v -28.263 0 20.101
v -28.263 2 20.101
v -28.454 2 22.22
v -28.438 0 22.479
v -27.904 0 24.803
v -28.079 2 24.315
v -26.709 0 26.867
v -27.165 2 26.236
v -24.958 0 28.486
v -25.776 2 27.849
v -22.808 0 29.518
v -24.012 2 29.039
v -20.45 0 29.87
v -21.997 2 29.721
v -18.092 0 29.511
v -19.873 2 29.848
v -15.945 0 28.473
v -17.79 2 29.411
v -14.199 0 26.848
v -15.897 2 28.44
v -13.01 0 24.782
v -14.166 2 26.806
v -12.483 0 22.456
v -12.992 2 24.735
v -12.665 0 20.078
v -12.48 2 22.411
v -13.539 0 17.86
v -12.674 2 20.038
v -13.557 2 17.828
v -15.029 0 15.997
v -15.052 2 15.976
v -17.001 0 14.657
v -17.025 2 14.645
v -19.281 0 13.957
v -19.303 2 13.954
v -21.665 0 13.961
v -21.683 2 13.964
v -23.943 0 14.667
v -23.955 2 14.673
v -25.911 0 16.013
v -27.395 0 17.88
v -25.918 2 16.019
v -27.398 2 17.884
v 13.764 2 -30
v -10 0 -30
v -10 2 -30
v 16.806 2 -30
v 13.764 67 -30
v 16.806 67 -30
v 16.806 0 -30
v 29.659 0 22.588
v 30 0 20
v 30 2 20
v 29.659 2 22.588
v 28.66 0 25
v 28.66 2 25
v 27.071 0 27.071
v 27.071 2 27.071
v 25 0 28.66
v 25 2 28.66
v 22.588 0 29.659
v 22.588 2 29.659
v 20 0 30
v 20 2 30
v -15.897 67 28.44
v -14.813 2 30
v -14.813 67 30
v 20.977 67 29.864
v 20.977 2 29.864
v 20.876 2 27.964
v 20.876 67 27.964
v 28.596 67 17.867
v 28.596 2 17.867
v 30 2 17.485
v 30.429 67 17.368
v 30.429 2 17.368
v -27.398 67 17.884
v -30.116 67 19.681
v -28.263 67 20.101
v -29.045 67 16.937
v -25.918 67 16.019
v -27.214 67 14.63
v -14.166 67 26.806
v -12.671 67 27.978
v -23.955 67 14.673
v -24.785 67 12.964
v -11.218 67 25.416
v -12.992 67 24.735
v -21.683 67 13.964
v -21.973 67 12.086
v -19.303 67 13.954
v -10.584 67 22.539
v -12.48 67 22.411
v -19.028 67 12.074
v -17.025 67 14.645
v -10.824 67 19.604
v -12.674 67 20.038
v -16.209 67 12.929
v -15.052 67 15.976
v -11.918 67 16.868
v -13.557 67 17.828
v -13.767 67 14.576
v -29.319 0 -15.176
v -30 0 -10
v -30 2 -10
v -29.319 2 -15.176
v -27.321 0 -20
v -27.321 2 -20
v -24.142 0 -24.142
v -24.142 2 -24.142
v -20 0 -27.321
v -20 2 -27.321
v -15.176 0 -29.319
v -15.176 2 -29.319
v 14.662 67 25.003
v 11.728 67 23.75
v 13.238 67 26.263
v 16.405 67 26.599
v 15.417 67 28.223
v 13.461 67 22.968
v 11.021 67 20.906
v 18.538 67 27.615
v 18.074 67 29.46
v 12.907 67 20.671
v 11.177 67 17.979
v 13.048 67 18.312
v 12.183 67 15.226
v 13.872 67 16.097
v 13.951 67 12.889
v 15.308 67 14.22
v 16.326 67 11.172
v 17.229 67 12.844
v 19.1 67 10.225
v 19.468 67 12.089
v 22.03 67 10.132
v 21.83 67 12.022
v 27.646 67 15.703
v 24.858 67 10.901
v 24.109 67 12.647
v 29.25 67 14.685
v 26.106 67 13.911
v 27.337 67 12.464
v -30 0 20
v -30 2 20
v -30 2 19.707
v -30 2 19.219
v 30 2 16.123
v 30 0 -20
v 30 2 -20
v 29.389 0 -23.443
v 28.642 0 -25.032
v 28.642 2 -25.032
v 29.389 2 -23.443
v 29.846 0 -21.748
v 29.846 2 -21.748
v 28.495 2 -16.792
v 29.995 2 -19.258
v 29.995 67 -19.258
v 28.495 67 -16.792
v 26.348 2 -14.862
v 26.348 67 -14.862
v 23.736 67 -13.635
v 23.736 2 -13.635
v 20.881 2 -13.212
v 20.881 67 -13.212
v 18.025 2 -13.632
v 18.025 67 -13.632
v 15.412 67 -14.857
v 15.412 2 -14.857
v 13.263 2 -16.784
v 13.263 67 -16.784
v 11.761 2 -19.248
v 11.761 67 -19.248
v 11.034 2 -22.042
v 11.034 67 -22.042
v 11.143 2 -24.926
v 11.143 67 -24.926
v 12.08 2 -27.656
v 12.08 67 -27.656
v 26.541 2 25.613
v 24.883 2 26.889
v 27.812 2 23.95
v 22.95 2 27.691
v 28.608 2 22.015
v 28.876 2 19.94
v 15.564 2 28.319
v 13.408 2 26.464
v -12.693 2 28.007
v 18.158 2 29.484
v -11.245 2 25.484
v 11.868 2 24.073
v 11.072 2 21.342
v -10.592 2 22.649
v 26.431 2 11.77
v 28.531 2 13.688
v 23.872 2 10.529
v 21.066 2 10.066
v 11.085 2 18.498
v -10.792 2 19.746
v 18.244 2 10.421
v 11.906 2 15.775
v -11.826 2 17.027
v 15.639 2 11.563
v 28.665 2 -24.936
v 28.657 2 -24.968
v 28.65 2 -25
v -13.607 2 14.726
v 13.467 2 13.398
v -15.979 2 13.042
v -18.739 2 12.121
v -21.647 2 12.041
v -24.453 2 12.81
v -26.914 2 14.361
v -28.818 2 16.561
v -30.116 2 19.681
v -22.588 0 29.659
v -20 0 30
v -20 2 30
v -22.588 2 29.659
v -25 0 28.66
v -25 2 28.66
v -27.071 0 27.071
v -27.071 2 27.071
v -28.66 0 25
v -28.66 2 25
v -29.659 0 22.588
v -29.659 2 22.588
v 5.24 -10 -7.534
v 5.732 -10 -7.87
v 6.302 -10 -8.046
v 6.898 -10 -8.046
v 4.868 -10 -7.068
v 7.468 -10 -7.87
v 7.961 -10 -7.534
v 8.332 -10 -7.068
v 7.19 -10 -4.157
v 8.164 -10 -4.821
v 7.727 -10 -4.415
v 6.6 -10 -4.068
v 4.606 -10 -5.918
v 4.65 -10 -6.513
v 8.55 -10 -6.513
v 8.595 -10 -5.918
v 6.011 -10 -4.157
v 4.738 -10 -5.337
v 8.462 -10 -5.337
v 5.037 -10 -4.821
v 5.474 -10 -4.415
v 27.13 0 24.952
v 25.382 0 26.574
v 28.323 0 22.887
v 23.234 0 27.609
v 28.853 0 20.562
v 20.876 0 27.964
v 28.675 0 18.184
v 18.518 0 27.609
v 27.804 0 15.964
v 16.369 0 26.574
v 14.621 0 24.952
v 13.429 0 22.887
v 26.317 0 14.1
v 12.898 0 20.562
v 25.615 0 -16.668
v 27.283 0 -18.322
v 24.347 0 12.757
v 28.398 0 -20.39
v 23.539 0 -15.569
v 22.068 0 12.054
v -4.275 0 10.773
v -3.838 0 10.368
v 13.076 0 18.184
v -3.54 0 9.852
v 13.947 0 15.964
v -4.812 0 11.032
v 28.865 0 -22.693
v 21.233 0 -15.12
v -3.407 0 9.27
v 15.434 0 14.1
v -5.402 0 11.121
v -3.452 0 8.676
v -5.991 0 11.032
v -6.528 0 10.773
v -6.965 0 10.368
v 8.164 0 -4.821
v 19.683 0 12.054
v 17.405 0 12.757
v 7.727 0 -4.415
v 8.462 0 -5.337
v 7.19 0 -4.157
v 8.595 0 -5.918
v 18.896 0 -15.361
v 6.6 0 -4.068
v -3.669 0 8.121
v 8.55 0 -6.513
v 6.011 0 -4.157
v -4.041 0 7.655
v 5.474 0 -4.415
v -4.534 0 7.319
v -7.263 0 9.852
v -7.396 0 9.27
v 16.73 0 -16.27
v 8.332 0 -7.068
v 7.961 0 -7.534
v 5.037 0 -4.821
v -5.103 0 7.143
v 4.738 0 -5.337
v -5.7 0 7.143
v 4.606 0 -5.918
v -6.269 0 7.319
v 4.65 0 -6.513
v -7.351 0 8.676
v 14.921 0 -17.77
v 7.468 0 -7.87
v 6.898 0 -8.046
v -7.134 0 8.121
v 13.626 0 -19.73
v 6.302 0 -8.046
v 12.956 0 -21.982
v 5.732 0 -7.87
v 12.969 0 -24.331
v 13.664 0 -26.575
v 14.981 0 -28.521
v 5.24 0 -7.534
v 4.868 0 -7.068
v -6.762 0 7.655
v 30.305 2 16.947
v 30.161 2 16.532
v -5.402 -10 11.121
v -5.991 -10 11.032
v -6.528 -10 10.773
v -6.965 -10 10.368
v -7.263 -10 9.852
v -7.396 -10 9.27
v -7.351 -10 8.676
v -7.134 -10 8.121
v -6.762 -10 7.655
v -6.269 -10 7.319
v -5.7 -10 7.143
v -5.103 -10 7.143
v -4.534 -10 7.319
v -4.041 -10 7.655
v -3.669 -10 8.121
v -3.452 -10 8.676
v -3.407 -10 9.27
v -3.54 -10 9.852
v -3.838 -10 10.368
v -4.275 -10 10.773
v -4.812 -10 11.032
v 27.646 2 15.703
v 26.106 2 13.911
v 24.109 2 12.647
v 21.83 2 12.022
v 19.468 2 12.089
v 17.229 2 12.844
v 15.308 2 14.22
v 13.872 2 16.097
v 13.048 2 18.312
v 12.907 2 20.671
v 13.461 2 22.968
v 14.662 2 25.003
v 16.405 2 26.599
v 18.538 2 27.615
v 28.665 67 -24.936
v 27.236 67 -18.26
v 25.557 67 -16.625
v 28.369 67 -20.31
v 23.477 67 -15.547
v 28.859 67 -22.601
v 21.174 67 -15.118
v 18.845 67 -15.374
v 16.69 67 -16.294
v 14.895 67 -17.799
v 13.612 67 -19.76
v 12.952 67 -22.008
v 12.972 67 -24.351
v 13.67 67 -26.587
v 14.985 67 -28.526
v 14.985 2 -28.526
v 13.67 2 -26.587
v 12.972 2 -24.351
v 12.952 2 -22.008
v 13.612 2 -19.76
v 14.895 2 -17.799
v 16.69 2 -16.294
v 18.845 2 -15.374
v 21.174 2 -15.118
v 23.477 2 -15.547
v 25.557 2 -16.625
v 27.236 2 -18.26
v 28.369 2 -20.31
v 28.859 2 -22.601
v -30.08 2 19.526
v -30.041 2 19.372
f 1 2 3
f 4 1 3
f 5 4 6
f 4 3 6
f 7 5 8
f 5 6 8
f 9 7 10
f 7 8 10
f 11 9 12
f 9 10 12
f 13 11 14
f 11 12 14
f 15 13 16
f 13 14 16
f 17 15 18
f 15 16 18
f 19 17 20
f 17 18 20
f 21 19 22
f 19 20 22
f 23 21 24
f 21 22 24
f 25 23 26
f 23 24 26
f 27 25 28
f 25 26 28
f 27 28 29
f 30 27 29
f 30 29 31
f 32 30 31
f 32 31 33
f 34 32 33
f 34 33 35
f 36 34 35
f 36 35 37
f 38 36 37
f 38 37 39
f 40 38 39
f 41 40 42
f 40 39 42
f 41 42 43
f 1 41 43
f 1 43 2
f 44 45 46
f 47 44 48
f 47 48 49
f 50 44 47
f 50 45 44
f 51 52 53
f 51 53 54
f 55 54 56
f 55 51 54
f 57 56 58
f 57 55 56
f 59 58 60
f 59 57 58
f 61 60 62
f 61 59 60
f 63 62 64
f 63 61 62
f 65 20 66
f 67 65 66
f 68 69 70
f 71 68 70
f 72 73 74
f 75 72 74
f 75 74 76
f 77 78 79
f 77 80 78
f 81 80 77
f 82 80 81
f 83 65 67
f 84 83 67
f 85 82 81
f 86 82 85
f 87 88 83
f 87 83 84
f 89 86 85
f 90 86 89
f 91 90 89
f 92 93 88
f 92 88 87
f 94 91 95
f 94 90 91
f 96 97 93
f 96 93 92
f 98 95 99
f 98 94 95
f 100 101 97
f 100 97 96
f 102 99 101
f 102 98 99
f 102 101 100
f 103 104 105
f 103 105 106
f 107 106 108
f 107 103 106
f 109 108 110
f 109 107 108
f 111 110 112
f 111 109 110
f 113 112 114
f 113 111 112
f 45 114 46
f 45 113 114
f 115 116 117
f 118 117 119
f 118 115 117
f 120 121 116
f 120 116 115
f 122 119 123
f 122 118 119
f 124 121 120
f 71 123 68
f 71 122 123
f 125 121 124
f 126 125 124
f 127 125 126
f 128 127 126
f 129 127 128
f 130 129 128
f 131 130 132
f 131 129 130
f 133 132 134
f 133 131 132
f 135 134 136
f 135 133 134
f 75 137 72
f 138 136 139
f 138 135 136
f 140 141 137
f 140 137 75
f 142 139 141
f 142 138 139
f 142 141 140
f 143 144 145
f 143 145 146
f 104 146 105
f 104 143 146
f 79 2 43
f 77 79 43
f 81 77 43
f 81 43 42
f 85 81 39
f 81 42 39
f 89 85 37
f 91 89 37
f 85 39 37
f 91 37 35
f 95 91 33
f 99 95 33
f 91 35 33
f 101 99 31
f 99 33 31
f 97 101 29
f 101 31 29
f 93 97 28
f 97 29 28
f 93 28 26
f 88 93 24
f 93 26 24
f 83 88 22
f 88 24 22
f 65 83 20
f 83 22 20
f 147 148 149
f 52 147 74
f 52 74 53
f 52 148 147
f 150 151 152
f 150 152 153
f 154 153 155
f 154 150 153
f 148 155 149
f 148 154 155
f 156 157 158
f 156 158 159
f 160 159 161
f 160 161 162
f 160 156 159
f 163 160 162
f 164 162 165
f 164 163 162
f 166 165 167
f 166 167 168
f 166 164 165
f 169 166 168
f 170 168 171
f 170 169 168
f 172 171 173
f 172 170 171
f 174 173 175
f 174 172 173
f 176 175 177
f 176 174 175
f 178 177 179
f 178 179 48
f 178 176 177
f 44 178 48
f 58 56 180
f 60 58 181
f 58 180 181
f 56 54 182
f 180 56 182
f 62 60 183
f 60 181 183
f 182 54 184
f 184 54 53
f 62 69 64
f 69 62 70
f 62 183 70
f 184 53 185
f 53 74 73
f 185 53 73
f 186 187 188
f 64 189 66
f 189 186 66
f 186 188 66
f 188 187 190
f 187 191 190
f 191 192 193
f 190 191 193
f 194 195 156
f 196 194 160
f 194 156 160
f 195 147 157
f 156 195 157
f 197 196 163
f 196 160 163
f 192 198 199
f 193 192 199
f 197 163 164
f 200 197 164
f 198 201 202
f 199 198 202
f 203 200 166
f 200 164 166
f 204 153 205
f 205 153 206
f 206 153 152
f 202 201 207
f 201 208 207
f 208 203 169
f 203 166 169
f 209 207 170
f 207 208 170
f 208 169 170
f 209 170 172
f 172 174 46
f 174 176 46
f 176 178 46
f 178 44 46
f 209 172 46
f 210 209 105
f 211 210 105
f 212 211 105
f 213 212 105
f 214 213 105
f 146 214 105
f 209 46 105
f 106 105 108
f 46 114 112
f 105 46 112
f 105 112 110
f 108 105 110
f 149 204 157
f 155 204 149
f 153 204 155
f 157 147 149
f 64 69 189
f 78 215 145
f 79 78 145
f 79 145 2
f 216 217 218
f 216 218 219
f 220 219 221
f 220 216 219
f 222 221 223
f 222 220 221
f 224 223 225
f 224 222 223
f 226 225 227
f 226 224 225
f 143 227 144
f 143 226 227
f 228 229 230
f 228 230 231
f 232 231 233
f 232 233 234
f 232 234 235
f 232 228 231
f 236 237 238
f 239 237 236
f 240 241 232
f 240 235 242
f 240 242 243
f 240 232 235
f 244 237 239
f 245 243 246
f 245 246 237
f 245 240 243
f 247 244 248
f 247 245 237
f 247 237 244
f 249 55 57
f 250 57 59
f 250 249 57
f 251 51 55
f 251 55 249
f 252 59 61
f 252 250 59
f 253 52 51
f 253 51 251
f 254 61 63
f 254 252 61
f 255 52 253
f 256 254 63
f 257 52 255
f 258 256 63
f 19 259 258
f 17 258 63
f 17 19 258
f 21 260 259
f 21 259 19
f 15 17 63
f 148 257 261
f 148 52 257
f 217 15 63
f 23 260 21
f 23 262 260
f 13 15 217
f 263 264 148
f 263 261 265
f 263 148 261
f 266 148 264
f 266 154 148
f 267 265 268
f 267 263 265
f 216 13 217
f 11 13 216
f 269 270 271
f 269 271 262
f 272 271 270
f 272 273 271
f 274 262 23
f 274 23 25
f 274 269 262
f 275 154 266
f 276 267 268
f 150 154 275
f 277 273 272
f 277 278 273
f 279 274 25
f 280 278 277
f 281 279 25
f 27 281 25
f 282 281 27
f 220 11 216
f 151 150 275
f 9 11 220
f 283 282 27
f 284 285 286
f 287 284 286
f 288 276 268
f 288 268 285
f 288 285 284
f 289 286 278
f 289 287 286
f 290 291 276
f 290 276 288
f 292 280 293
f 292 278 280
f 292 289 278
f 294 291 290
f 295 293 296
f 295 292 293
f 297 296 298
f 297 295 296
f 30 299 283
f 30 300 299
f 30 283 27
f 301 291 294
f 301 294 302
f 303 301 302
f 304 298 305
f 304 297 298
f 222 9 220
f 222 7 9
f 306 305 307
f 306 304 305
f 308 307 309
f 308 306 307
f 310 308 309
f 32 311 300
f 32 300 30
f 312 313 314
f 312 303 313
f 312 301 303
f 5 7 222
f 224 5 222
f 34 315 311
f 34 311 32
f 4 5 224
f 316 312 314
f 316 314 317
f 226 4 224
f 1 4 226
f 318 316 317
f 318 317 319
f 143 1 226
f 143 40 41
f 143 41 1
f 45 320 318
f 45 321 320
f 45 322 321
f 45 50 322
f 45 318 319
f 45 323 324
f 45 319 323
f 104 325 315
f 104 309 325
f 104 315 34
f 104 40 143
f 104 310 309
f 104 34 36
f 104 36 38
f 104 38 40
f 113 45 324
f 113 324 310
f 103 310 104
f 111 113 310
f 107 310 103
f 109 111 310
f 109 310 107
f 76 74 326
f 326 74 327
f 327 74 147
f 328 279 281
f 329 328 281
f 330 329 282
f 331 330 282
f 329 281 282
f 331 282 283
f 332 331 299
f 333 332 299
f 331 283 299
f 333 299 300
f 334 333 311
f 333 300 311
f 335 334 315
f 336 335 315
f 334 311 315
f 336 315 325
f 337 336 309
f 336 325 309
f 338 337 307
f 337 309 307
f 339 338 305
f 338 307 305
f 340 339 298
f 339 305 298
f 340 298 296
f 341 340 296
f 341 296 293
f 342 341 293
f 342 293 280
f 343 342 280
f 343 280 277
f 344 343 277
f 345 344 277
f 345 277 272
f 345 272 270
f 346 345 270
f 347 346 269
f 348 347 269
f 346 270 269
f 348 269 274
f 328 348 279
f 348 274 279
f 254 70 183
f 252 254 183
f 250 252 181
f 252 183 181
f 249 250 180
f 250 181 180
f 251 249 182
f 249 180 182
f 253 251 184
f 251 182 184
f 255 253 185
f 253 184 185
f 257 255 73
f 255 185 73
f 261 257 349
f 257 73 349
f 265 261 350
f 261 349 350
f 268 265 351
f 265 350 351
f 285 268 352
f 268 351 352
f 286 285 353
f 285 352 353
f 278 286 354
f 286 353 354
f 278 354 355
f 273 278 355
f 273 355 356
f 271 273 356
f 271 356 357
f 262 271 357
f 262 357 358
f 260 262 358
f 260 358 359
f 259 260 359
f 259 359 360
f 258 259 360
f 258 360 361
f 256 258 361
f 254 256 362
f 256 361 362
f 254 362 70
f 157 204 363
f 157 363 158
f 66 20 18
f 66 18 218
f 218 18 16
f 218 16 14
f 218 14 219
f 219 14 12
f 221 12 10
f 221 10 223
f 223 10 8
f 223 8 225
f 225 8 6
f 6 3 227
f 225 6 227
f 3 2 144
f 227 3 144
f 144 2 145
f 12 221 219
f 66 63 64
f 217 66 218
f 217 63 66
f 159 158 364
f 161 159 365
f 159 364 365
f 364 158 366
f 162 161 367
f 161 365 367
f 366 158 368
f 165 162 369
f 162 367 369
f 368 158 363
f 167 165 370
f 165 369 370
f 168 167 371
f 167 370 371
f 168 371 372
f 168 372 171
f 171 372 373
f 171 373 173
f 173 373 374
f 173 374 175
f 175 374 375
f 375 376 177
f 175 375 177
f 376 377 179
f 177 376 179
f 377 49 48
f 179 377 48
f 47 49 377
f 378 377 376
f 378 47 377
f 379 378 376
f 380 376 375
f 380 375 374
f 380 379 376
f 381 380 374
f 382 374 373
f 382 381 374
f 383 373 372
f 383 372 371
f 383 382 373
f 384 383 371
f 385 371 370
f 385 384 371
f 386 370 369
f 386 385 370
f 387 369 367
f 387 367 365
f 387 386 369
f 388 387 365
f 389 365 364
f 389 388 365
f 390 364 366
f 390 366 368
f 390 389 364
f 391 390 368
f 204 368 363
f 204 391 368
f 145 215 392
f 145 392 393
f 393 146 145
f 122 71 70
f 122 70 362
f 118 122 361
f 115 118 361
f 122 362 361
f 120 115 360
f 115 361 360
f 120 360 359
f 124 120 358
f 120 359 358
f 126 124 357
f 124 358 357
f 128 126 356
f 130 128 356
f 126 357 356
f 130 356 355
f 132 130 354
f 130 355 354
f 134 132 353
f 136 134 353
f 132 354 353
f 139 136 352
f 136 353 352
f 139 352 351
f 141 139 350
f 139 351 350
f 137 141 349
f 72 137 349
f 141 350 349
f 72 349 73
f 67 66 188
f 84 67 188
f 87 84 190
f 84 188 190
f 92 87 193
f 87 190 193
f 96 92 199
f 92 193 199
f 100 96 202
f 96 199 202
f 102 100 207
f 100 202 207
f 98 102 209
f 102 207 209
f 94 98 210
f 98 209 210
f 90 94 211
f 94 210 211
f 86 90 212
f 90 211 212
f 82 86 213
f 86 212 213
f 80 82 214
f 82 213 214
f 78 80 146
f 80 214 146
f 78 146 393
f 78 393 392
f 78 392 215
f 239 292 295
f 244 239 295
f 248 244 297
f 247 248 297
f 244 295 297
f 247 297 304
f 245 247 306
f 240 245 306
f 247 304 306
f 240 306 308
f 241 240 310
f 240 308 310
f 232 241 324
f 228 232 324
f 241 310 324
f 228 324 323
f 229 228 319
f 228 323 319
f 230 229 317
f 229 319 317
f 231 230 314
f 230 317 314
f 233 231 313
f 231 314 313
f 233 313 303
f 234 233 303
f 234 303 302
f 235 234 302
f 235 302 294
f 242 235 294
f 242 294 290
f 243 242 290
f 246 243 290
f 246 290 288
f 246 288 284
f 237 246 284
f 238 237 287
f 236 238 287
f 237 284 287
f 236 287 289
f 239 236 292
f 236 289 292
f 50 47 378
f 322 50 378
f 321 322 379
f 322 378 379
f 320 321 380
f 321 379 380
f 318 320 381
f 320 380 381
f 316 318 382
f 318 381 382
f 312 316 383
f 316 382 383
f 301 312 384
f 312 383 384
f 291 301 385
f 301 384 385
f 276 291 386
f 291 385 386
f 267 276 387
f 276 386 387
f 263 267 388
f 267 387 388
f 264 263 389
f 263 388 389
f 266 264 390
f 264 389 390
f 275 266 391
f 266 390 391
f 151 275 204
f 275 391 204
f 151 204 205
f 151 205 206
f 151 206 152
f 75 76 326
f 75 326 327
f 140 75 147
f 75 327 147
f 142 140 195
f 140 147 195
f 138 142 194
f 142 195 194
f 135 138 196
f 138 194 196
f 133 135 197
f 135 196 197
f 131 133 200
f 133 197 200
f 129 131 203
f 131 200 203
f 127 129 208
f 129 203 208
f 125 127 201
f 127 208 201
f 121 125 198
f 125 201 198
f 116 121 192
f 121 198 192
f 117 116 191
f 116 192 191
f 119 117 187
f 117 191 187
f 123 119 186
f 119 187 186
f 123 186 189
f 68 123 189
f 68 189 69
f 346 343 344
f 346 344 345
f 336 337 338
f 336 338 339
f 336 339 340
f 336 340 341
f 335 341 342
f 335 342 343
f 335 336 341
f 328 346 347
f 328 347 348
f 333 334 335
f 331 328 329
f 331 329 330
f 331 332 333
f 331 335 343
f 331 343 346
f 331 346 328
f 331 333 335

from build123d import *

# Parameters (mm, degrees)
BOSS_EXTRUDE1_DEPTH  = 2
BOSS_EXTRUDE9_DEPTH  = 65
SKETCH6_R            = 8
CUT_EXTRUDE3_DEPTH   = 78.787752397
SKETCH7_R            = 2
BOSS_EXTRUDE10_DEPTH = 10
SKETCH8_R            = 2
BOSS_EXTRUDE11_DEPTH = 10


with BuildPart() as part:
    # Sketch2 → Boss-Extrude1 (new body)
    with BuildSketch(Plane(origin=(0, 0, 0), x_dir=(1, 0, 0), z_dir=(0, 1, 0))):
        with BuildLine():
            Line((-10, 30), (20, 30))
            ThreePointArc((20, 30), (27.071067812, 27.071067812), (30, 20))
            Line((30, 20), (30, -20))
            ThreePointArc((30, -20), (27.071067812, -27.071067812), (20, -30))
            Line((20, -30), (-20, -30))
            ThreePointArc((-20, -30), (-27.071067812, -27.071067812), (-30, -20))
            Line((-30, -20), (-30, 10))
            ThreePointArc((-30, 10), (-24.142135624, 24.142135624), (-10, 30))
        make_face()
    extrude(amount=BOSS_EXTRUDE1_DEPTH)

    # Sketch5 → Boss-Extrude9 (add)
    with BuildSketch(Plane(origin=(0, 2, 0), x_dir=(1, 0, 0), z_dir=(0, 1, 0))):
        with BuildLine():
            Line((-30.116404199, -19.68082931), (-28.263425554, -20.100912803))
            ThreePointArc((-28.263425554, -20.100912803), (-15.988853518, -15.236719498), (-15.896791782, -28.439636592))
            Line((-15.896791782, -28.439636592), (-14.812694906, -30))
            ThreePointArc((-14.812694906, -30), (-14.926621305, -13.661390096), (-30.116404199, -19.68082931))
        make_face()
        with BuildLine():
            Line((20.977105182, -29.863851609), (20.875608793, -27.964371901))
            ThreePointArc((20.875608793, -27.964371901), (14.520196839, -15.105489427), (28.595658733, -17.866556627))
            Line((28.595658733, -17.866556627), (30.429170594, -17.368325499))
            ThreePointArc((30.429170594, -17.368325499), (12.980066991, -13.991900081), (20.977105182, -29.863851609))
        make_face()
        with BuildLine():
            Line((13.764397277, 30), (16.80629322, 30))
            ThreePointArc((16.80629322, 30), (17.733969491, 15.754964907), (28.664900588, 24.936269467))
            Line((28.664900588, 24.936269467), (29.994544588, 19.258061402))
            ThreePointArc((29.994544588, 19.258061402), (15.411631267, 14.856680059), (13.764397277, 30))
        make_face()
    extrude(amount=BOSS_EXTRUDE9_DEPTH)

    # Sketch6 → Cut-Extrude3 (cut, through all)
    with BuildSketch(Plane(origin=(0, 2, 0), x_dir=(1, 0, 0), z_dir=(0, 1, 0))):
        with Locations((20.875608793, 23.112281164)):
            Circle(SKETCH6_R)
        with Locations(Location((-20.461410206, -21.869685402, 0), (0, 0, 167.226551727))):
            Circle(SKETCH6_R)
        with Locations(Location((20.875608793, -19.964371901, 0), (0, 0, 270))):
            Circle(SKETCH6_R)
    extrude(amount=-CUT_EXTRUDE3_DEPTH, mode=Mode.SUBTRACT)

    # Sketch7 → Boss-Extrude10 (add)
    with BuildSketch(Plane.XZ):
        with Locations(Location((6.600213653, -6.067854065, 0), (0, 0, 90))):
            Circle(SKETCH7_R)
    extrude(amount=BOSS_EXTRUDE10_DEPTH)

    # Sketch8 → Boss-Extrude11 (add)
    with BuildSketch(Plane.XZ):
        with Locations(Location((-5.40151955, 9.120930292, 0), (0, 0, 90))):
            Circle(SKETCH8_R)
    extrude(amount=BOSS_EXTRUDE11_DEPTH)


solid = part.part
